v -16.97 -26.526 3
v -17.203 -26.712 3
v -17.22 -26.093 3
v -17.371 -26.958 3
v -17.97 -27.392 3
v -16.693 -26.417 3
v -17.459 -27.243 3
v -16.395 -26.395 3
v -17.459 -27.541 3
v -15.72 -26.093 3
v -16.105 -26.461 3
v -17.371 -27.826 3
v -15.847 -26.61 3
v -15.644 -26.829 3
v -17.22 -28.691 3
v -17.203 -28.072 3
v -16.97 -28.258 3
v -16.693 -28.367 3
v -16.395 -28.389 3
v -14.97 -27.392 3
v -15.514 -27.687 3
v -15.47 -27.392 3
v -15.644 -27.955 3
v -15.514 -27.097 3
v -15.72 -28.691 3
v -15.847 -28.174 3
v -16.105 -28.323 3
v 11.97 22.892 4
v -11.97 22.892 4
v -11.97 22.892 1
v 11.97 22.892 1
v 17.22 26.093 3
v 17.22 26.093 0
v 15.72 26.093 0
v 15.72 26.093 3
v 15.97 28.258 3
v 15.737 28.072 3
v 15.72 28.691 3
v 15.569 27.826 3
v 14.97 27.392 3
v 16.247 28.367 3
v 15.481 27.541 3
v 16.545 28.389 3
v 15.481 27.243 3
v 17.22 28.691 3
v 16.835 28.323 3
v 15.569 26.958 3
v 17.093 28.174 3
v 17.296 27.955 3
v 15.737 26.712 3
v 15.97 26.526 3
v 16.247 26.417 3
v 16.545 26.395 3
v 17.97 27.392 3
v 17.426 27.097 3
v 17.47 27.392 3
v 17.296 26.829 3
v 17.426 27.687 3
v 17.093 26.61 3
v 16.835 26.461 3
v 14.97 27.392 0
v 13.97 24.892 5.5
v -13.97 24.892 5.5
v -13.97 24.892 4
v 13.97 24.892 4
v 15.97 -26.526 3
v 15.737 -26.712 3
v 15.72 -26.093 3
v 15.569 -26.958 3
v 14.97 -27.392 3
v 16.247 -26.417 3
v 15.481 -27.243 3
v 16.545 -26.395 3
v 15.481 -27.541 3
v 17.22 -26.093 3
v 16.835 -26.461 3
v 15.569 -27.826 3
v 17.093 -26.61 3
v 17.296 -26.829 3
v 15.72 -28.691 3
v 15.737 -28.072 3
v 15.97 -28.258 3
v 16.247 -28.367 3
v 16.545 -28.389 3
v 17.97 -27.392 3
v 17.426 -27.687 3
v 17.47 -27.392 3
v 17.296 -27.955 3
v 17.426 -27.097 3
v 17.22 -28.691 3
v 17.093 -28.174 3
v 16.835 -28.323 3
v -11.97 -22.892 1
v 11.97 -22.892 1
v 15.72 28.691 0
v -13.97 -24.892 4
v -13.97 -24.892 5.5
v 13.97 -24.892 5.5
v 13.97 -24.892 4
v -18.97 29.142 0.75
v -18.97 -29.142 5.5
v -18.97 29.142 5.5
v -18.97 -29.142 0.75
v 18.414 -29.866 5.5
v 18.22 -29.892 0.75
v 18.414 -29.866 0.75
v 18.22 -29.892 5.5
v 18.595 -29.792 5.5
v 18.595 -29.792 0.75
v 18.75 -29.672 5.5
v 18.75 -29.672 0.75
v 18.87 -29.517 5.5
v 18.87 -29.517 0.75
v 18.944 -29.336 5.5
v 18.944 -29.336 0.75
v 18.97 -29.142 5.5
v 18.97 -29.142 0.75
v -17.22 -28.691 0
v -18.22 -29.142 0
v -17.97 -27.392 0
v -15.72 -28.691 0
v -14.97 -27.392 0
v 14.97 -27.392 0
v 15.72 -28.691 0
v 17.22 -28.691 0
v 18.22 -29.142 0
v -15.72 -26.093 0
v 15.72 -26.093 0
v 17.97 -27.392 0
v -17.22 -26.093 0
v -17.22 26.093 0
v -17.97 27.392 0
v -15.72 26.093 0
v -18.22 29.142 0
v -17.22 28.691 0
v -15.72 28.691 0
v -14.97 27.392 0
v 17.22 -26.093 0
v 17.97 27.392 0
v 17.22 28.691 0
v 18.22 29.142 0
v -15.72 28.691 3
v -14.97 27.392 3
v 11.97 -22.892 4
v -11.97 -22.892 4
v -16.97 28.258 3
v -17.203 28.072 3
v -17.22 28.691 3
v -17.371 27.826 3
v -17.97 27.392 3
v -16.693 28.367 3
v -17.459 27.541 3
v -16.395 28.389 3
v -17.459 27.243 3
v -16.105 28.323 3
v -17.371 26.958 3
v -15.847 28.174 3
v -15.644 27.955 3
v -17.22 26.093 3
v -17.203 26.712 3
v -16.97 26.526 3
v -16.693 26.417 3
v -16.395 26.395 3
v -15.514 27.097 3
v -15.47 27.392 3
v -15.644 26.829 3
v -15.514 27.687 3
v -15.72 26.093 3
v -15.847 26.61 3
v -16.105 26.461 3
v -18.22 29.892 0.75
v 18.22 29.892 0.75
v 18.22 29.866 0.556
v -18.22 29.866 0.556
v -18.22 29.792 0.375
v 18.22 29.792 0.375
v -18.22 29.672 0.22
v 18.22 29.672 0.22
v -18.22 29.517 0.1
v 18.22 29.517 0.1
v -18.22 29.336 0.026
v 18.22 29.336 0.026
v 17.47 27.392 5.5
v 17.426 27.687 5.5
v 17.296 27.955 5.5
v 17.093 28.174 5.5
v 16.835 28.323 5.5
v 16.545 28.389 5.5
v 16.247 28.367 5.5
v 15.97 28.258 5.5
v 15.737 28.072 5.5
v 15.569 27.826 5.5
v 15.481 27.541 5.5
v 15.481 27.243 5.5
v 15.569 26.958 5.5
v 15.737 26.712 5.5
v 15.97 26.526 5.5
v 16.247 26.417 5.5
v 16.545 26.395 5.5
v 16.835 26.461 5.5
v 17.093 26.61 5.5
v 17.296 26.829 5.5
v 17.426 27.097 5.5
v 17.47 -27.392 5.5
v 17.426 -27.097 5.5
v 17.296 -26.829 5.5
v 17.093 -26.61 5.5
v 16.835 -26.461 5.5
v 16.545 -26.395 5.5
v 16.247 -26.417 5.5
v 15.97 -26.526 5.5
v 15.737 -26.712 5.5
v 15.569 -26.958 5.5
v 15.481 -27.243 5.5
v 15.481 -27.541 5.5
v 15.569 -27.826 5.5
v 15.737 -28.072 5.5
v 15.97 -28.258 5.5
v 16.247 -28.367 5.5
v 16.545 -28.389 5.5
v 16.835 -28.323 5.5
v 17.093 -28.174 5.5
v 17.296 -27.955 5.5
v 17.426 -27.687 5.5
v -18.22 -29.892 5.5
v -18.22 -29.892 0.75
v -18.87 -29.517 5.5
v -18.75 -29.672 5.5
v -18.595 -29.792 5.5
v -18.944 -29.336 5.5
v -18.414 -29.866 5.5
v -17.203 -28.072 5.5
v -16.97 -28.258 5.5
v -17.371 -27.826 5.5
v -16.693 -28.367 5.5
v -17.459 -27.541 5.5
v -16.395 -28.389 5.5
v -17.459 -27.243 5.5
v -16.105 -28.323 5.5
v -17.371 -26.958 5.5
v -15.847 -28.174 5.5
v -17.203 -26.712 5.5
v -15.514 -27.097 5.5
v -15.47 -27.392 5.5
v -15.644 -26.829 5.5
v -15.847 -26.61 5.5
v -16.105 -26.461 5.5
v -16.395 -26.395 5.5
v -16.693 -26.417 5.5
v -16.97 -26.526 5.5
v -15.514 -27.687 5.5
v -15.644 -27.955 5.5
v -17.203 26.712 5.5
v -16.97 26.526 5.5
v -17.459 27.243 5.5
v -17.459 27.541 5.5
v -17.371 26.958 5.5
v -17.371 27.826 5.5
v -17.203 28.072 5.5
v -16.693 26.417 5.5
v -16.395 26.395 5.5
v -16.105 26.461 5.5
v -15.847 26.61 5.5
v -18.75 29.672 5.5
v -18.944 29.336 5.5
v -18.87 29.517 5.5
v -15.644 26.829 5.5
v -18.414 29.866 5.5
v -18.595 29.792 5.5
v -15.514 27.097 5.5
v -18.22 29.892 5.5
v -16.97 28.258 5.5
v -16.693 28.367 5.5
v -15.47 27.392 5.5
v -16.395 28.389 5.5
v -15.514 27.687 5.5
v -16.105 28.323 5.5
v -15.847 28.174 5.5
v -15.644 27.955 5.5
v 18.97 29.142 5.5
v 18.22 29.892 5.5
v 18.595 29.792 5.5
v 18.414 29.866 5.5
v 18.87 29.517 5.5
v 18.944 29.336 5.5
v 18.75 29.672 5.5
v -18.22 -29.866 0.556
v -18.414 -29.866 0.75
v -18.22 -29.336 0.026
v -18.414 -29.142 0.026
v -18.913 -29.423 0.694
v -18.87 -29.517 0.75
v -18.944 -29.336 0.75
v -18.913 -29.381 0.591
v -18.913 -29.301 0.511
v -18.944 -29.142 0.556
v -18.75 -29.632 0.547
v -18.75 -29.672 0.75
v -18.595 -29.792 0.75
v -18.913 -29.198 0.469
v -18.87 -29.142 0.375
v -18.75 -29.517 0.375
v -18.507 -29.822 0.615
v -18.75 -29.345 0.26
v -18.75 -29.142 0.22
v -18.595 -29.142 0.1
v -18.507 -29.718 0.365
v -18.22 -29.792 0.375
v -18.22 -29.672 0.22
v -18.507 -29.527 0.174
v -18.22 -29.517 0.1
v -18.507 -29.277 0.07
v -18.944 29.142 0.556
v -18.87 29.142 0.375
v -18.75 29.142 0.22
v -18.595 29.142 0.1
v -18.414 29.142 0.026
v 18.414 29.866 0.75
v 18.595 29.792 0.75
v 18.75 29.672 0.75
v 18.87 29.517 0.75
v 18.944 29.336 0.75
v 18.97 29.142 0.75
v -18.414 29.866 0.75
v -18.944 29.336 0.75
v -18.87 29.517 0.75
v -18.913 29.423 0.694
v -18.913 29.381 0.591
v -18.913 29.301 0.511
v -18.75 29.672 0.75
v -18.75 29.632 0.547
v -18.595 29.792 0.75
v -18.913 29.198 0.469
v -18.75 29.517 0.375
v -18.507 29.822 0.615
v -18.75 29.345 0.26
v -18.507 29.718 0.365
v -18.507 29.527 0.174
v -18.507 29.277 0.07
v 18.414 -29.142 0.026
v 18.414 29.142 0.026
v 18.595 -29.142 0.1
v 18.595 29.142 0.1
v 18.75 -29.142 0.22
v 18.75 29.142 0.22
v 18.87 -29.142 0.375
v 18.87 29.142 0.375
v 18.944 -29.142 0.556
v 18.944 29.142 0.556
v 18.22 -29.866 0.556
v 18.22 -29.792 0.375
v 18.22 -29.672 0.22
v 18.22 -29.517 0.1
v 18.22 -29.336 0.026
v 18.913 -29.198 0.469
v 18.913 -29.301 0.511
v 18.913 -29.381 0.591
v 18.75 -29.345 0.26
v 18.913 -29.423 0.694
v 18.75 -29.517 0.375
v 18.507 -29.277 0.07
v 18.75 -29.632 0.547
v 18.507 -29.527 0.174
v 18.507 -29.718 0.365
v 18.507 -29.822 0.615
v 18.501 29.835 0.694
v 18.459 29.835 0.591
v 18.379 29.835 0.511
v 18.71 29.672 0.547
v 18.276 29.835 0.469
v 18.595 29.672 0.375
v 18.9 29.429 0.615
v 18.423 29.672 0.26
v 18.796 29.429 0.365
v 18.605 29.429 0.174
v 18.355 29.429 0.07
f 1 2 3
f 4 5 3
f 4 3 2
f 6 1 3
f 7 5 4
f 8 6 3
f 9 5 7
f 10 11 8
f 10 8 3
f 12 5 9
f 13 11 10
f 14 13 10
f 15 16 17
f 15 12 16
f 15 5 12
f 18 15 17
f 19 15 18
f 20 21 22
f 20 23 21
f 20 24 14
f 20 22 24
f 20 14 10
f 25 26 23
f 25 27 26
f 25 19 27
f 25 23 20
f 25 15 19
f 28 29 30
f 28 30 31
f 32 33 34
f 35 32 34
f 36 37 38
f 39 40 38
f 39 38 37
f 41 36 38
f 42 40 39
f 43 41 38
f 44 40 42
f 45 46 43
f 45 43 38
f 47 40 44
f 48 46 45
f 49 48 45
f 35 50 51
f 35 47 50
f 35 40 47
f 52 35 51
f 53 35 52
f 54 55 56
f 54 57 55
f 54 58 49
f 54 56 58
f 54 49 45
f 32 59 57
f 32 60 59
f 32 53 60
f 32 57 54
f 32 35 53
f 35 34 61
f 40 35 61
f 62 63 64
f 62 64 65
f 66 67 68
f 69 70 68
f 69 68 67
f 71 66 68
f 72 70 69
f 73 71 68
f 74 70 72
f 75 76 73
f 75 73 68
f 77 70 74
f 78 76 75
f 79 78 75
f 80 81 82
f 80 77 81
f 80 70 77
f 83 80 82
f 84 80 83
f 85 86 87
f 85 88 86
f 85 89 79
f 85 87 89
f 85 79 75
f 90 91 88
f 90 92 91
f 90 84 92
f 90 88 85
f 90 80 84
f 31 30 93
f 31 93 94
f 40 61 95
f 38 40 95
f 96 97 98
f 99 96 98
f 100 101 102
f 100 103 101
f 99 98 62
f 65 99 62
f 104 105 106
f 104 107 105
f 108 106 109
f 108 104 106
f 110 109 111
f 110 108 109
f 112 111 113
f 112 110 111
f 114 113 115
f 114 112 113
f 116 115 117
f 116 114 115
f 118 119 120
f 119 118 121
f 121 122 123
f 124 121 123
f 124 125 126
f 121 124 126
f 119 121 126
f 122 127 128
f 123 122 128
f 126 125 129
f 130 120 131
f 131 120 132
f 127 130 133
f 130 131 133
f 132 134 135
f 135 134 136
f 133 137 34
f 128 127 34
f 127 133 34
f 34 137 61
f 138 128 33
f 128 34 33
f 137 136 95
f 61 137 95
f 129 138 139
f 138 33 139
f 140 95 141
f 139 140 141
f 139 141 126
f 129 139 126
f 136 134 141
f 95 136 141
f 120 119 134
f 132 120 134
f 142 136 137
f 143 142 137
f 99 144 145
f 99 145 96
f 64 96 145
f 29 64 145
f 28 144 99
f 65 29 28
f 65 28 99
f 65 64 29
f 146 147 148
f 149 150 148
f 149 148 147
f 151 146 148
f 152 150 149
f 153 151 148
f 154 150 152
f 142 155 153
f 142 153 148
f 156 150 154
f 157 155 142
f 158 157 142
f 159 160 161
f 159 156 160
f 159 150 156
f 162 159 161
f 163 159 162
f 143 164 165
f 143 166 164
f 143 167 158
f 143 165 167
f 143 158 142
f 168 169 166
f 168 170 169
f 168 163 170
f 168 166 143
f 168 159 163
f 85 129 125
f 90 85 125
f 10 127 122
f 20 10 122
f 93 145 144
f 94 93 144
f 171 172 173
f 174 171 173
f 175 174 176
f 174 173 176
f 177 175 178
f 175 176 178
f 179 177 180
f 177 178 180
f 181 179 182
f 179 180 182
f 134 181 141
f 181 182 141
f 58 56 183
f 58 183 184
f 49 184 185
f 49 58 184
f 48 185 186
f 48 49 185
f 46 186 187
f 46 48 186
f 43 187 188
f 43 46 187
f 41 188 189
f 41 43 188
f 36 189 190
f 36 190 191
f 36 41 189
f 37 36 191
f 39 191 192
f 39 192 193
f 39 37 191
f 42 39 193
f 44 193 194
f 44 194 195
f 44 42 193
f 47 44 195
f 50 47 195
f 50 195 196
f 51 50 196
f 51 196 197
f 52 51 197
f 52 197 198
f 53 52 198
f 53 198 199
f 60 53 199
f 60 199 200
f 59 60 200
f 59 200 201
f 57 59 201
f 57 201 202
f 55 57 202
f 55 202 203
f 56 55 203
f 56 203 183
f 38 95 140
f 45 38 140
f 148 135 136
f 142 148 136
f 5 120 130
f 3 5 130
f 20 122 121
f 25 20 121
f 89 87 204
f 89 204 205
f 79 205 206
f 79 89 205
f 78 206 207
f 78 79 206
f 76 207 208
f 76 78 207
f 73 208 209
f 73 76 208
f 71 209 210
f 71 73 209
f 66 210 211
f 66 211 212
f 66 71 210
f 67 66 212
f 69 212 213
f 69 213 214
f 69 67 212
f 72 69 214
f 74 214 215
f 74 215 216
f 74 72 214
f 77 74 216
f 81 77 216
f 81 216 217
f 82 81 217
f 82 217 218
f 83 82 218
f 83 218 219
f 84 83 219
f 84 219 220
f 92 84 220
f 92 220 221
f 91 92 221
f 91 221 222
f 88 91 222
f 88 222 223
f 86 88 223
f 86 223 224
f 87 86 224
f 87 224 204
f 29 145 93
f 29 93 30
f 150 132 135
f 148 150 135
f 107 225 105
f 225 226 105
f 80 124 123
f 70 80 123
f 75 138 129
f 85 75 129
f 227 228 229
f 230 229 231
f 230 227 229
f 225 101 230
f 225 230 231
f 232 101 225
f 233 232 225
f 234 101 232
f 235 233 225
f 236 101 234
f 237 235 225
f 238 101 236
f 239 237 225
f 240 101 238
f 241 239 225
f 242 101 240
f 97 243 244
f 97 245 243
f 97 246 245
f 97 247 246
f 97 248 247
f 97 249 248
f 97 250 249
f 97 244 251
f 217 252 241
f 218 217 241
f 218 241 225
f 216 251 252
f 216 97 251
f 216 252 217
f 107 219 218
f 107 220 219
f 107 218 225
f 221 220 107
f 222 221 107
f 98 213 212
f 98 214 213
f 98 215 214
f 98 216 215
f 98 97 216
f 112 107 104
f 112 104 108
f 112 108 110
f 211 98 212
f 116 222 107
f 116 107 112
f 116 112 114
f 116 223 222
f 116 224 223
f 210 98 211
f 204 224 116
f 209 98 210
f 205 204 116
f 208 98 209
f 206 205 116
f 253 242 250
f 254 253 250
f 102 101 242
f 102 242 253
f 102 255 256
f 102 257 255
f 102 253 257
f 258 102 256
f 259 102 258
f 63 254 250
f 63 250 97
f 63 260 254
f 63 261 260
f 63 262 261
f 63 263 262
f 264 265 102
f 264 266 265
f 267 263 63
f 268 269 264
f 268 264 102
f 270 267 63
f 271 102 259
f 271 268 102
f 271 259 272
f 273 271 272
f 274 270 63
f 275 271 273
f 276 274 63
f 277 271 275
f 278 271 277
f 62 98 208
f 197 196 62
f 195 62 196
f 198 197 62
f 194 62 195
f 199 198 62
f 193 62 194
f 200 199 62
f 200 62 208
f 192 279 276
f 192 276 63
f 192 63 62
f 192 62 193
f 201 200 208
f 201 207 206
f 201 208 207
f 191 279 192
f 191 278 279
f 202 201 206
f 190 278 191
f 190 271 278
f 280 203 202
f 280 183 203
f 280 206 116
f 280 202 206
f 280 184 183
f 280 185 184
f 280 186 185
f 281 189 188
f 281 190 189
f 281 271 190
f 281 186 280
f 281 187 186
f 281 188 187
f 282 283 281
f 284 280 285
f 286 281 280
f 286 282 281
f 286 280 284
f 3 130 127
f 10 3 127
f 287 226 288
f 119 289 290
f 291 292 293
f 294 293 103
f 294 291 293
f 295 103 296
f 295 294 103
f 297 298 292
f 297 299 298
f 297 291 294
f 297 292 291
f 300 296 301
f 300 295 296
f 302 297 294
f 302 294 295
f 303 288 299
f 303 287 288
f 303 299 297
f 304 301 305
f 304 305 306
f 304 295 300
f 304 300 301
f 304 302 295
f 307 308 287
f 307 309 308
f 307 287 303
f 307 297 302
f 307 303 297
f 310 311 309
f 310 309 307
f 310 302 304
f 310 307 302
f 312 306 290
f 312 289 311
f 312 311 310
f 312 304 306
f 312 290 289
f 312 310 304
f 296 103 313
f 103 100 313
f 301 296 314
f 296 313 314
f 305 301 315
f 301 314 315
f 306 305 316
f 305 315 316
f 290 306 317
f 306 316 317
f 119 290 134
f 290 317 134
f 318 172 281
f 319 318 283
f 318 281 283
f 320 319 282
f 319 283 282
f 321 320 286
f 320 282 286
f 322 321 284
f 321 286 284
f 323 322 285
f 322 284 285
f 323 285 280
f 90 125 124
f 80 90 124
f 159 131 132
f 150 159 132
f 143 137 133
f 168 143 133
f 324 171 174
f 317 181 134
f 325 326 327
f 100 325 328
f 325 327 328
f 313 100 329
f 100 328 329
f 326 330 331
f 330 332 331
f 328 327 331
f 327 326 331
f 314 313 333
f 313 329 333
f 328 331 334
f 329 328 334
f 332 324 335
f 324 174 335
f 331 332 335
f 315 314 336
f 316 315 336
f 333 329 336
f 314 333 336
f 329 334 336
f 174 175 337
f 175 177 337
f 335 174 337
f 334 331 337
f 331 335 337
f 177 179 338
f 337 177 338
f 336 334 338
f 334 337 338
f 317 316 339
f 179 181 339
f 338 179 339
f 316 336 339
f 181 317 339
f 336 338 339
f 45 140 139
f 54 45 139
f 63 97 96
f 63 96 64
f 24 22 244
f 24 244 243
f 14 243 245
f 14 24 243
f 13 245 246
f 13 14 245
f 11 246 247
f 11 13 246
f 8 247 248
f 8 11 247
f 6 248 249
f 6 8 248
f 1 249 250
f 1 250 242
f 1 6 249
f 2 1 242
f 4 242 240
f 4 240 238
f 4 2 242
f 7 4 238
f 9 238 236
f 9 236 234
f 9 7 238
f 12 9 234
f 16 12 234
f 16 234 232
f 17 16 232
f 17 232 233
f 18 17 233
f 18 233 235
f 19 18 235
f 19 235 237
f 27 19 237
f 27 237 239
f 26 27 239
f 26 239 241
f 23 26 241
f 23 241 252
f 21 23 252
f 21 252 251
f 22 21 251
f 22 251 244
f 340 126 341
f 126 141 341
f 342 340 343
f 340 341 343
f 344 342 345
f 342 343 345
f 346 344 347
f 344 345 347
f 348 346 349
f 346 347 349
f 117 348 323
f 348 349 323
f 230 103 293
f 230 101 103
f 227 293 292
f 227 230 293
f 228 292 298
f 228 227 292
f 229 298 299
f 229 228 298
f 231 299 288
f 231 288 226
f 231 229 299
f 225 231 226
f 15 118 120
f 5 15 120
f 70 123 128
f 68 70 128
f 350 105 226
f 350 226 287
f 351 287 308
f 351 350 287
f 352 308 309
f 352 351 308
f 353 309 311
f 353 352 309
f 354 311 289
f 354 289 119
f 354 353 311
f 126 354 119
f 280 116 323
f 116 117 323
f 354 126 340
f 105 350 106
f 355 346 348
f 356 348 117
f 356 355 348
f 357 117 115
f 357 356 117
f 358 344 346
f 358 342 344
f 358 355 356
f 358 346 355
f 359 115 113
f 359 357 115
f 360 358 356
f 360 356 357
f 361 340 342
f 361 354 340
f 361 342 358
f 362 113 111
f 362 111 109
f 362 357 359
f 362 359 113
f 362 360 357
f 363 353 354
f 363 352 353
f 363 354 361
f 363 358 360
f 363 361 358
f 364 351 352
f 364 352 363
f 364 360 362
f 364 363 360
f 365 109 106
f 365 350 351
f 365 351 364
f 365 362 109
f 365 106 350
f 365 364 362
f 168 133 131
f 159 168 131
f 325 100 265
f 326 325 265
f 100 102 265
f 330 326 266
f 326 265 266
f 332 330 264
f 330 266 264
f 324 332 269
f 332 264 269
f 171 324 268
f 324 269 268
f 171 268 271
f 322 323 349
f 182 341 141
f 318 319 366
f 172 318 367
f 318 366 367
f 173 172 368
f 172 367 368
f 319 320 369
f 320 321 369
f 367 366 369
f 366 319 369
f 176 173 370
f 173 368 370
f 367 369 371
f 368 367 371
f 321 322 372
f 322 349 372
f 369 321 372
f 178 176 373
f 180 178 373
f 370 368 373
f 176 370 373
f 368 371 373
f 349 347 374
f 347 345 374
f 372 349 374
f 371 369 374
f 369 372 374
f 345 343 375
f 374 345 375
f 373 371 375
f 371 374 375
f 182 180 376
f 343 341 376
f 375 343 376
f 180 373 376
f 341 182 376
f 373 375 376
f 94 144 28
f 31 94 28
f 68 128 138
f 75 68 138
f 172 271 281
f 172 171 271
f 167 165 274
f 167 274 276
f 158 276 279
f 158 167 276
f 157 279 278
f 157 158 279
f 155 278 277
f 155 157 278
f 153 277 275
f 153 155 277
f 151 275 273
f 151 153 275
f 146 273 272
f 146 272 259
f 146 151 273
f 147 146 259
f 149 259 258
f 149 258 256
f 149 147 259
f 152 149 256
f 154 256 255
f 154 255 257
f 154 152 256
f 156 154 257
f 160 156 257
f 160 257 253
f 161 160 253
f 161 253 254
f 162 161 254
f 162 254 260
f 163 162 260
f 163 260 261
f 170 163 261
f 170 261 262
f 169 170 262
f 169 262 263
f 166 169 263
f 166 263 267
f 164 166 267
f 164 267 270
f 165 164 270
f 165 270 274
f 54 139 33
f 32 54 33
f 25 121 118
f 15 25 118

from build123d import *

# Parameters (mm, degrees)
SKETCH001_W     = 37.94
SKETCH001_H     = 59.784
SKETCH001_R     = 1
PAD_DEPTH       = 5.5
SKETCH002_W     = 27.94
SKETCH002_H     = 49.784
POCKET_DEPTH    = 1.5
SKETCH_W        = 23.94
SKETCH_H        = 45.784
POCKET001_DEPTH = 3
POCKET002_DEPTH = 3
FILLET_R        = 0.75


with BuildPart() as part:
    # Sketch001 → Pad (new body)
    with BuildSketch(Plane.XY):
        Rectangle(SKETCH001_W, SKETCH001_H)
        with Locations((-16.47, 27.392)):
            Circle(SKETCH001_R, mode=Mode.SUBTRACT)
        with Locations((16.47, 27.392)):
            Circle(SKETCH001_R, mode=Mode.SUBTRACT)
        with Locations((-16.47, -27.392)):
            Circle(SKETCH001_R, mode=Mode.SUBTRACT)
        with Locations((16.47, -27.392)):
            Circle(SKETCH001_R, mode=Mode.SUBTRACT)
    extrude(amount=PAD_DEPTH)

    # Sketch002 (on Face10 of Pad) → Pocket (cut)
    with BuildSketch(Plane.XY.offset(5.5)):
        Rectangle(SKETCH002_W, SKETCH002_H)
    extrude(amount=-POCKET_DEPTH, mode=Mode.SUBTRACT)

    # Sketch (on Face15 of Pocket) → Pocket001 (cut)
    with BuildSketch(Plane.XY.offset(4)):
        Rectangle(SKETCH_W, SKETCH_H)
    extrude(amount=-POCKET001_DEPTH, mode=Mode.SUBTRACT)

    # Sketch003 (on Face4 of Pocket001) → Pocket002 (cut)
    with BuildSketch(Plane(origin=(0, 0, 0), x_dir=(1, 0, 0), z_dir=(0, 0, -1))):
        Polygon((-15.72, 26.092962), (-14.97, 27.392), (-15.72, 28.691038), (-17.22, 28.691038), (-17.97, 27.392), (-17.22, 26.092962), align=None)
        Polygon((17.22, 26.092962), (17.97, 27.392), (17.22, 28.691038), (15.72, 28.691038), (14.97, 27.392), (15.72, 26.092962), align=None)
        Polygon((-15.72, -28.691038), (-14.97, -27.392), (-15.72, -26.092962), (-17.22, -26.092962), (-17.97, -27.392), (-17.22, -28.691038), align=None)
        Polygon((17.22, -28.691038), (17.97, -27.392), (17.22, -26.092962), (15.72, -26.092962), (14.97, -27.392), (15.72, -28.691038), align=None)
    extrude(amount=-POCKET002_DEPTH, mode=Mode.SUBTRACT)

    # Fillet
    fillet_edges = [part.edges().sort_by_distance(p)[0] for p in [
        (0, -29.892, 0),
        (18.97, 0, 0),
        (18.97, 29.892, 2.75),
        (-18.97, -29.892, 2.75),
        (18.97, -29.892, 2.75),
        (0, 29.892, 0),
        (-18.97, 29.892, 2.75),
        (-18.97, 0, 0),
    ]]
    fillet(fillet_edges, radius=FILLET_R)


solid = part.part
